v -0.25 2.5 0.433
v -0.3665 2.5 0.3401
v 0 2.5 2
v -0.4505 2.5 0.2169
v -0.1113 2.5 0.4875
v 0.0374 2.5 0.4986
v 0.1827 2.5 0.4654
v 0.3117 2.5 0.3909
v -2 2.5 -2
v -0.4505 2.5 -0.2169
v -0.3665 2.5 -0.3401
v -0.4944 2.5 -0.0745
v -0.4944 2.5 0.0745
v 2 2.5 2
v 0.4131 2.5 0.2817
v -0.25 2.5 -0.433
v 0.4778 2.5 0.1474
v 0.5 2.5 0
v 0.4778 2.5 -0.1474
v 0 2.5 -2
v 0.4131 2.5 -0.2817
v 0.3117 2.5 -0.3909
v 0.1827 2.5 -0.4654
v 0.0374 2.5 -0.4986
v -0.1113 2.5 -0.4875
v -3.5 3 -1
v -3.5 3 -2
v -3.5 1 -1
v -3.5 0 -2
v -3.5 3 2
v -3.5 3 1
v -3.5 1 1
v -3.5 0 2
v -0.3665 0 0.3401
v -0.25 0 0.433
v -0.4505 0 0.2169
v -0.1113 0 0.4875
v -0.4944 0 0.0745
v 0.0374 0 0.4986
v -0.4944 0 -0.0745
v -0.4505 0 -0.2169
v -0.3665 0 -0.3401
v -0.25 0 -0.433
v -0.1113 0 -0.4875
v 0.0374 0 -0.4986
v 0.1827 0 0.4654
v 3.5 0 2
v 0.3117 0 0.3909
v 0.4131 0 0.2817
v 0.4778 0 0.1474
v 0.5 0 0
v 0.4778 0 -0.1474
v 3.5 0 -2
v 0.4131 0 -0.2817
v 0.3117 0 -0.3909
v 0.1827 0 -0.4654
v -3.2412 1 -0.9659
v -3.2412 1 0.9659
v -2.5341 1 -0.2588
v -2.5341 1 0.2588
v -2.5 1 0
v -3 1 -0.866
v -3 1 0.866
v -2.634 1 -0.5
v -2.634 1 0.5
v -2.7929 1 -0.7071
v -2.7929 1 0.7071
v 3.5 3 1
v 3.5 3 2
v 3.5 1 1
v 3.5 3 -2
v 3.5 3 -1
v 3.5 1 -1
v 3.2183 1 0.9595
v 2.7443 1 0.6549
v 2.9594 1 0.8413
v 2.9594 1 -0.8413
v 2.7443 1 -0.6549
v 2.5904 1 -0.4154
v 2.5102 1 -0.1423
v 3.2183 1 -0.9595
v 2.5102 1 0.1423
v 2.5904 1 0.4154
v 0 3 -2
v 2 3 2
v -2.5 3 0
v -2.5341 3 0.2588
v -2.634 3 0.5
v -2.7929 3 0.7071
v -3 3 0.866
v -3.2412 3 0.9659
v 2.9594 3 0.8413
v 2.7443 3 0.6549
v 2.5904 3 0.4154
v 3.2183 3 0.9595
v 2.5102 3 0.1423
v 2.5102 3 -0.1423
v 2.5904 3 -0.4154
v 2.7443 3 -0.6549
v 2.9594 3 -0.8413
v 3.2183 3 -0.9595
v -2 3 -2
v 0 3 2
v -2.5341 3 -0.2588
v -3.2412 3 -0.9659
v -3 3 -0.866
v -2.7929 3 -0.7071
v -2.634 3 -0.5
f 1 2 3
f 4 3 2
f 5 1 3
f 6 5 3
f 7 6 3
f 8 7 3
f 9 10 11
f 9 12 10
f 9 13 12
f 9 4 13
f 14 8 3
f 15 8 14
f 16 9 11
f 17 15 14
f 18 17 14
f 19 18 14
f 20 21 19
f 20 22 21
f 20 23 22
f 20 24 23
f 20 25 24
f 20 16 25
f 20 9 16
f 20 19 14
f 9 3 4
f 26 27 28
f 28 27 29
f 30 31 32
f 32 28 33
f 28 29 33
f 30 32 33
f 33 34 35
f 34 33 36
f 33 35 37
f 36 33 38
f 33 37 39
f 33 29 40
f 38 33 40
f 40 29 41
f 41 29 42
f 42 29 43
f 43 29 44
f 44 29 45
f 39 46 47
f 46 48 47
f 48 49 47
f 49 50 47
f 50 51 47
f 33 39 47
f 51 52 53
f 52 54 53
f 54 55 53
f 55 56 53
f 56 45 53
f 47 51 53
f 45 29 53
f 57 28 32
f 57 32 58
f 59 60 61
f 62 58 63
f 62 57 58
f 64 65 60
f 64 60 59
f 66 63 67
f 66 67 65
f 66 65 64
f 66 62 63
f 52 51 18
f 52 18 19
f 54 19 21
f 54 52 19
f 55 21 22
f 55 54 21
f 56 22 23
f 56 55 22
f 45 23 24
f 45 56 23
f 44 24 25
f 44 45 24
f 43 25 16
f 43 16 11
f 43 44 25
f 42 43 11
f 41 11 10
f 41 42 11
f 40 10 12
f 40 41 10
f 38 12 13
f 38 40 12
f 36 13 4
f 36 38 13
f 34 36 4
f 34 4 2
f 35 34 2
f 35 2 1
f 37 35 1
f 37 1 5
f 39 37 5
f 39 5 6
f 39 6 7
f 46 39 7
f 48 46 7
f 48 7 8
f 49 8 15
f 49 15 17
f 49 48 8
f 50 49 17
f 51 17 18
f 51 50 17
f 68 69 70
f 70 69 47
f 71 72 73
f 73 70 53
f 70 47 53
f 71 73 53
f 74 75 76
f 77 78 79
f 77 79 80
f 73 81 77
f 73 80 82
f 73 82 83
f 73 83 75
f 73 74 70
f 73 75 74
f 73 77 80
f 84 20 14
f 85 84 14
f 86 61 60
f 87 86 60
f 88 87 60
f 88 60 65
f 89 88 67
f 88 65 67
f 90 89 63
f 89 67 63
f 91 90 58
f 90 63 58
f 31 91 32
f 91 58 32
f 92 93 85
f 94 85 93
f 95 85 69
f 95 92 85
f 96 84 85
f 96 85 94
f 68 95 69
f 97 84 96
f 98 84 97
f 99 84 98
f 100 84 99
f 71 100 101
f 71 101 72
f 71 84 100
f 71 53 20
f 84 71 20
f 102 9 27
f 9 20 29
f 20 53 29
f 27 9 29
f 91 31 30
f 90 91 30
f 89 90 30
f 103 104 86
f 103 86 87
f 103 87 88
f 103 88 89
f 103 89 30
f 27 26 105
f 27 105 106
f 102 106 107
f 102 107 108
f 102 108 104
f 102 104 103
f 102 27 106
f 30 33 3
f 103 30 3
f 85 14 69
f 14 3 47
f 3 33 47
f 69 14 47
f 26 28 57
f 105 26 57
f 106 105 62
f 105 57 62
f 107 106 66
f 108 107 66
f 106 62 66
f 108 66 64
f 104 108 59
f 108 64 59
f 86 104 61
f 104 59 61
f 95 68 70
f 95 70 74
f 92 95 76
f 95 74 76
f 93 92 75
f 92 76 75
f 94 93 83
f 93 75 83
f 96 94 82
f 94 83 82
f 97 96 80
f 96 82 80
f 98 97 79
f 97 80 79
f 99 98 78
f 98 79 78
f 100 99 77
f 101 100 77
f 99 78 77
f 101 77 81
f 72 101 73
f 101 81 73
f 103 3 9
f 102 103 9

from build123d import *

# Parameters (mm, degrees)
BOSS_EXTRUDE1_DEPTH   = 1
BOSS_EXTRUDE1_2_DEPTH = 1
BOSS_EXTRUDE2_DEPTH   = 3
SKETCH1_4_R           = 0.5
BOSS_EXTRUDE3_DEPTH   = 2.5


with BuildPart() as part:
    # Sketch1 → Boss-Extrude1 (new body)
    with BuildSketch(Plane(origin=(0, 0, 0), x_dir=(1, 0, 0), z_dir=(0, 1, 0))):
        with BuildLine():
            Line((-3.5, 1), (-3.5, -1))
            ThreePointArc((-3.5, -1), (-2.5, 0), (-3.5, 1))
        make_face()
    extrude(amount=BOSS_EXTRUDE1_DEPTH)



with BuildPart() as body_2:
    # Sketch1 → Boss-Extrude1 2 (new body)
    with BuildSketch(Plane(origin=(0, 0, 0), x_dir=(1, 0, 0), z_dir=(0, 1, 0))):
        with BuildLine():
            ThreePointArc((3.5, 1), (2.5, 0), (3.5, -1))
            Line((3.5, -1), (3.5, 1))
        make_face()
    extrude(amount=BOSS_EXTRUDE1_2_DEPTH)


with BuildPart() as part_1:
    add(part.part)

    add(body_2.part)  # Boss-Extrude2 merges body 2
    # Sketch1<3> → Boss-Extrude2 (add)
    with BuildSketch(Plane(origin=(0, 0, 0), x_dir=(1, 0, 0), z_dir=(0, 1, 0))):
        with BuildLine():
            Line((-3.5, -2), (0, -2))
            Line((0, -2), (-2, 2))
            Line((-2, 2), (-3.5, 2))
            Line((-3.5, 2), (-3.5, 1))
            ThreePointArc((-3.5, 1), (-2.5, 0), (-3.5, -1))
            Line((-3.5, -1), (-3.5, -2))
        make_face()
        with BuildLine():
            Line((0, 2), (2, -2))
            Line((2, -2), (3.5, -2))
            Line((3.5, -2), (3.5, -1))
            ThreePointArc((3.5, -1), (2.5, 0), (3.5, 1))
            Line((3.5, 1), (3.5, 2))
            Line((3.5, 2), (0, 2))
        make_face()
    extrude(amount=BOSS_EXTRUDE2_DEPTH)

    # Sketch1<4> → Boss-Extrude3 (add)
    with BuildSketch(Plane(origin=(0, 0, 0), x_dir=(1, 0, 0), z_dir=(0, 1, 0))):
        Polygon((-2, 2), (0, -2), (2, -2), (0, 2), align=None)
        Circle(SKETCH1_4_R, mode=Mode.SUBTRACT)
    extrude(amount=BOSS_EXTRUDE3_DEPTH)


solid = part_1.part
